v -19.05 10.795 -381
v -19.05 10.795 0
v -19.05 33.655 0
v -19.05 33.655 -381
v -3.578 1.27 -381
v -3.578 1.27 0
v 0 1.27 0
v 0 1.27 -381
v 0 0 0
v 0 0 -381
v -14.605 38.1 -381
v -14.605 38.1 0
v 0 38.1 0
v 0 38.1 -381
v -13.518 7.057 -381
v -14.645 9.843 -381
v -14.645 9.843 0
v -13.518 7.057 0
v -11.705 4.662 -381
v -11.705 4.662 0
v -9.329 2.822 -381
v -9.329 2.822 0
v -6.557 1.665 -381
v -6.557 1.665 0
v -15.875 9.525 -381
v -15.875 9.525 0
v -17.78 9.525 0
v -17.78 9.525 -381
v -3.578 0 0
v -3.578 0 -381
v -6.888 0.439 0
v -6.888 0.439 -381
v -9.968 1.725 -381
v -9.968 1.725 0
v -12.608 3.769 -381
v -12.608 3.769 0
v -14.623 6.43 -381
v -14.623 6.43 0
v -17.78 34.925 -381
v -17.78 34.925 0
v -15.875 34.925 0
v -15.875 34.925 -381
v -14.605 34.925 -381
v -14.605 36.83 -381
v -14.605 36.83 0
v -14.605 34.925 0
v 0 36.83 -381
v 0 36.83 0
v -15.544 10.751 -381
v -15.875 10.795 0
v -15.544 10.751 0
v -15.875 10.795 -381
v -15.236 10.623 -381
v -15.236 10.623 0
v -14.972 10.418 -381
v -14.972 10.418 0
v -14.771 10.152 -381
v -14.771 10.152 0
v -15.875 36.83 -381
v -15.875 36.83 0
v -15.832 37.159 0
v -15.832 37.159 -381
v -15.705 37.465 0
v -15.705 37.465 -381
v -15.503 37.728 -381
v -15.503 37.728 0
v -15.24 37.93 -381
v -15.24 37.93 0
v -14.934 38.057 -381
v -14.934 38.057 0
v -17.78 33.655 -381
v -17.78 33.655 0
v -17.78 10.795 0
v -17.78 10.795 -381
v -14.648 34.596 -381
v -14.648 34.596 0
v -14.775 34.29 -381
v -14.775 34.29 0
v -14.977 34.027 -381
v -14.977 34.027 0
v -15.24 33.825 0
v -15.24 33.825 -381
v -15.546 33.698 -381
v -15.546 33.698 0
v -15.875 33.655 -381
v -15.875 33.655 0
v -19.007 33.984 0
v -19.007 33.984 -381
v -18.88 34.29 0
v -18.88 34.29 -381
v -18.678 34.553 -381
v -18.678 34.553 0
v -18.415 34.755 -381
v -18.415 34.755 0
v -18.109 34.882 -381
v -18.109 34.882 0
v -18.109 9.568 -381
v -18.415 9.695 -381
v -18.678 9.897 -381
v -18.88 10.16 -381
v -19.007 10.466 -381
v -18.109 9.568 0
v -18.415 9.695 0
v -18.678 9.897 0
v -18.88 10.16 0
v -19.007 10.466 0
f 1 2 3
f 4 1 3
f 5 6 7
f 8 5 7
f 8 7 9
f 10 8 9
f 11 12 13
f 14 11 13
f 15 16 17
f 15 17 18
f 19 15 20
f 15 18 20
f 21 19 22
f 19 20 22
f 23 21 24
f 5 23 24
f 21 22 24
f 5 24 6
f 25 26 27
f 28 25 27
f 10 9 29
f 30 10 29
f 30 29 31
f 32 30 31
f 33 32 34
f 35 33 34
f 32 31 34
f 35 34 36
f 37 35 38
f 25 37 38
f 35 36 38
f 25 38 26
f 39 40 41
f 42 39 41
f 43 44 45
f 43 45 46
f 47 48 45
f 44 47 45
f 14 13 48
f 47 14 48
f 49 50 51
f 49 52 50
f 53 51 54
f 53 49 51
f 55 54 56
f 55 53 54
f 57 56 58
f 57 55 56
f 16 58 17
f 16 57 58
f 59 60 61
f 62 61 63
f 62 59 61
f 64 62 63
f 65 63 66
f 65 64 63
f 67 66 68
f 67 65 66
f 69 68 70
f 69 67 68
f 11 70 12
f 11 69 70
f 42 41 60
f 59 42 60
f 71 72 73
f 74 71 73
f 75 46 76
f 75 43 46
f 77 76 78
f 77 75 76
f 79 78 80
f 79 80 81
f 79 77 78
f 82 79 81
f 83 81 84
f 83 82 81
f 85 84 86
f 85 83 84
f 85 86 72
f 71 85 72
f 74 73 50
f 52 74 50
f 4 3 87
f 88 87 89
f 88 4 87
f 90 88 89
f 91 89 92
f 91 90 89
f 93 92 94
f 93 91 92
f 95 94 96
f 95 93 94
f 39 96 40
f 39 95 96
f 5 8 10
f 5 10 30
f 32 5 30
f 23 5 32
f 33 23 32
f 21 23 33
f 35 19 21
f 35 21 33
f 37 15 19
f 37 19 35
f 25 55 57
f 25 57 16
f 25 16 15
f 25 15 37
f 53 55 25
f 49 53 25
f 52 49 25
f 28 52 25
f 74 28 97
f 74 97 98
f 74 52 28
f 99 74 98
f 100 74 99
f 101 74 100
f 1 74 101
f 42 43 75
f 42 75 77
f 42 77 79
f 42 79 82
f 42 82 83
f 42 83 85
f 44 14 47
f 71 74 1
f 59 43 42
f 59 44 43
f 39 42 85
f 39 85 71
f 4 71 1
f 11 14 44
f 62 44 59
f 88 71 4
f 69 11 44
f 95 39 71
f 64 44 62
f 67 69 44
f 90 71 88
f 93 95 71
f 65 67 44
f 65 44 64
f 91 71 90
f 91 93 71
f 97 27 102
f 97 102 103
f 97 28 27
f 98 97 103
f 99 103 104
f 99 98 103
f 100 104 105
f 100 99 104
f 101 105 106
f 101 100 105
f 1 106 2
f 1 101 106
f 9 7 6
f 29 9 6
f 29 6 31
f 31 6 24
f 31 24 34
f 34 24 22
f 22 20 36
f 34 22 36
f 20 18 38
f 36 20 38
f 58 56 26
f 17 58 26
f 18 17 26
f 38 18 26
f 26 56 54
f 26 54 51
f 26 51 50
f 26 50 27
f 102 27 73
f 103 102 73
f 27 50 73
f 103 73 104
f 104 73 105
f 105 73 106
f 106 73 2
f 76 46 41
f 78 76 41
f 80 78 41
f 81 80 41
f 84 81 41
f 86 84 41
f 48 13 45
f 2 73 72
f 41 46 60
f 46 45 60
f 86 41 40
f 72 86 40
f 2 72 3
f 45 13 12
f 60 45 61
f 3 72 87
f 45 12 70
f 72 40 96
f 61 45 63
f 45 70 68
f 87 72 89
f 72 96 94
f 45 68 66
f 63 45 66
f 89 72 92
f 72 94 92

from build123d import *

# Parameters (mm, degrees)
EXTRUDE_THIN1_DEPTH = 381
FILLET1_R           = 1.27


with BuildPart() as part:
    # Sketch1 → Extrude-Thin1 (new body)
    with BuildSketch(Plane.XY):
        with BuildLine():
            Line((0, 0), (-3.578277876, 0))
            ThreePointArc((-3.578277876, 0), (-11.355407809, 2.659768429), (-15.875, 9.525))
            Line((-15.875, 9.525), (-19.05, 9.525))
            Line((-19.05, 9.525), (-19.05, 34.925))
            Line((-19.05, 34.925), (-15.875, 34.925))
            Line((-15.875, 34.925), (-15.875, 38.1))
            Line((-15.875, 38.1), (0, 38.1))
            Line((0, 38.1), (0, 36.83))
            Line((0, 36.83), (-14.605, 36.83))
            Line((-14.605, 36.83), (-14.605, 33.655))
            Line((-14.605, 33.655), (-17.78, 33.655))
            Line((-17.78, 33.655), (-17.78, 10.795))
            Line((-17.78, 10.795), (-14.848409863, 10.795))
            ThreePointArc((-14.848409863, 10.795), (-10.95631115, 3.970193301), (-3.578277876, 1.27))
            Line((-3.578277876, 1.27), (0, 1.27))
            Line((0, 1.27), (0, 0))
        make_face()
    extrude(amount=-EXTRUDE_THIN1_DEPTH)

    # Fillet1
    fillet1_edges = [part.edges().sort_by_distance(p)[0] for p in [
        (-14.605, 33.655, -190.5),
        (-14.848409863, 10.795, -190.5),
        (-19.05, 9.525, -190.5),
        (-19.05, 34.925, -190.5),
        (-15.875, 38.1, -190.5),
    ]]
    fillet(fillet1_edges, radius=FILLET1_R)


solid = part.part
